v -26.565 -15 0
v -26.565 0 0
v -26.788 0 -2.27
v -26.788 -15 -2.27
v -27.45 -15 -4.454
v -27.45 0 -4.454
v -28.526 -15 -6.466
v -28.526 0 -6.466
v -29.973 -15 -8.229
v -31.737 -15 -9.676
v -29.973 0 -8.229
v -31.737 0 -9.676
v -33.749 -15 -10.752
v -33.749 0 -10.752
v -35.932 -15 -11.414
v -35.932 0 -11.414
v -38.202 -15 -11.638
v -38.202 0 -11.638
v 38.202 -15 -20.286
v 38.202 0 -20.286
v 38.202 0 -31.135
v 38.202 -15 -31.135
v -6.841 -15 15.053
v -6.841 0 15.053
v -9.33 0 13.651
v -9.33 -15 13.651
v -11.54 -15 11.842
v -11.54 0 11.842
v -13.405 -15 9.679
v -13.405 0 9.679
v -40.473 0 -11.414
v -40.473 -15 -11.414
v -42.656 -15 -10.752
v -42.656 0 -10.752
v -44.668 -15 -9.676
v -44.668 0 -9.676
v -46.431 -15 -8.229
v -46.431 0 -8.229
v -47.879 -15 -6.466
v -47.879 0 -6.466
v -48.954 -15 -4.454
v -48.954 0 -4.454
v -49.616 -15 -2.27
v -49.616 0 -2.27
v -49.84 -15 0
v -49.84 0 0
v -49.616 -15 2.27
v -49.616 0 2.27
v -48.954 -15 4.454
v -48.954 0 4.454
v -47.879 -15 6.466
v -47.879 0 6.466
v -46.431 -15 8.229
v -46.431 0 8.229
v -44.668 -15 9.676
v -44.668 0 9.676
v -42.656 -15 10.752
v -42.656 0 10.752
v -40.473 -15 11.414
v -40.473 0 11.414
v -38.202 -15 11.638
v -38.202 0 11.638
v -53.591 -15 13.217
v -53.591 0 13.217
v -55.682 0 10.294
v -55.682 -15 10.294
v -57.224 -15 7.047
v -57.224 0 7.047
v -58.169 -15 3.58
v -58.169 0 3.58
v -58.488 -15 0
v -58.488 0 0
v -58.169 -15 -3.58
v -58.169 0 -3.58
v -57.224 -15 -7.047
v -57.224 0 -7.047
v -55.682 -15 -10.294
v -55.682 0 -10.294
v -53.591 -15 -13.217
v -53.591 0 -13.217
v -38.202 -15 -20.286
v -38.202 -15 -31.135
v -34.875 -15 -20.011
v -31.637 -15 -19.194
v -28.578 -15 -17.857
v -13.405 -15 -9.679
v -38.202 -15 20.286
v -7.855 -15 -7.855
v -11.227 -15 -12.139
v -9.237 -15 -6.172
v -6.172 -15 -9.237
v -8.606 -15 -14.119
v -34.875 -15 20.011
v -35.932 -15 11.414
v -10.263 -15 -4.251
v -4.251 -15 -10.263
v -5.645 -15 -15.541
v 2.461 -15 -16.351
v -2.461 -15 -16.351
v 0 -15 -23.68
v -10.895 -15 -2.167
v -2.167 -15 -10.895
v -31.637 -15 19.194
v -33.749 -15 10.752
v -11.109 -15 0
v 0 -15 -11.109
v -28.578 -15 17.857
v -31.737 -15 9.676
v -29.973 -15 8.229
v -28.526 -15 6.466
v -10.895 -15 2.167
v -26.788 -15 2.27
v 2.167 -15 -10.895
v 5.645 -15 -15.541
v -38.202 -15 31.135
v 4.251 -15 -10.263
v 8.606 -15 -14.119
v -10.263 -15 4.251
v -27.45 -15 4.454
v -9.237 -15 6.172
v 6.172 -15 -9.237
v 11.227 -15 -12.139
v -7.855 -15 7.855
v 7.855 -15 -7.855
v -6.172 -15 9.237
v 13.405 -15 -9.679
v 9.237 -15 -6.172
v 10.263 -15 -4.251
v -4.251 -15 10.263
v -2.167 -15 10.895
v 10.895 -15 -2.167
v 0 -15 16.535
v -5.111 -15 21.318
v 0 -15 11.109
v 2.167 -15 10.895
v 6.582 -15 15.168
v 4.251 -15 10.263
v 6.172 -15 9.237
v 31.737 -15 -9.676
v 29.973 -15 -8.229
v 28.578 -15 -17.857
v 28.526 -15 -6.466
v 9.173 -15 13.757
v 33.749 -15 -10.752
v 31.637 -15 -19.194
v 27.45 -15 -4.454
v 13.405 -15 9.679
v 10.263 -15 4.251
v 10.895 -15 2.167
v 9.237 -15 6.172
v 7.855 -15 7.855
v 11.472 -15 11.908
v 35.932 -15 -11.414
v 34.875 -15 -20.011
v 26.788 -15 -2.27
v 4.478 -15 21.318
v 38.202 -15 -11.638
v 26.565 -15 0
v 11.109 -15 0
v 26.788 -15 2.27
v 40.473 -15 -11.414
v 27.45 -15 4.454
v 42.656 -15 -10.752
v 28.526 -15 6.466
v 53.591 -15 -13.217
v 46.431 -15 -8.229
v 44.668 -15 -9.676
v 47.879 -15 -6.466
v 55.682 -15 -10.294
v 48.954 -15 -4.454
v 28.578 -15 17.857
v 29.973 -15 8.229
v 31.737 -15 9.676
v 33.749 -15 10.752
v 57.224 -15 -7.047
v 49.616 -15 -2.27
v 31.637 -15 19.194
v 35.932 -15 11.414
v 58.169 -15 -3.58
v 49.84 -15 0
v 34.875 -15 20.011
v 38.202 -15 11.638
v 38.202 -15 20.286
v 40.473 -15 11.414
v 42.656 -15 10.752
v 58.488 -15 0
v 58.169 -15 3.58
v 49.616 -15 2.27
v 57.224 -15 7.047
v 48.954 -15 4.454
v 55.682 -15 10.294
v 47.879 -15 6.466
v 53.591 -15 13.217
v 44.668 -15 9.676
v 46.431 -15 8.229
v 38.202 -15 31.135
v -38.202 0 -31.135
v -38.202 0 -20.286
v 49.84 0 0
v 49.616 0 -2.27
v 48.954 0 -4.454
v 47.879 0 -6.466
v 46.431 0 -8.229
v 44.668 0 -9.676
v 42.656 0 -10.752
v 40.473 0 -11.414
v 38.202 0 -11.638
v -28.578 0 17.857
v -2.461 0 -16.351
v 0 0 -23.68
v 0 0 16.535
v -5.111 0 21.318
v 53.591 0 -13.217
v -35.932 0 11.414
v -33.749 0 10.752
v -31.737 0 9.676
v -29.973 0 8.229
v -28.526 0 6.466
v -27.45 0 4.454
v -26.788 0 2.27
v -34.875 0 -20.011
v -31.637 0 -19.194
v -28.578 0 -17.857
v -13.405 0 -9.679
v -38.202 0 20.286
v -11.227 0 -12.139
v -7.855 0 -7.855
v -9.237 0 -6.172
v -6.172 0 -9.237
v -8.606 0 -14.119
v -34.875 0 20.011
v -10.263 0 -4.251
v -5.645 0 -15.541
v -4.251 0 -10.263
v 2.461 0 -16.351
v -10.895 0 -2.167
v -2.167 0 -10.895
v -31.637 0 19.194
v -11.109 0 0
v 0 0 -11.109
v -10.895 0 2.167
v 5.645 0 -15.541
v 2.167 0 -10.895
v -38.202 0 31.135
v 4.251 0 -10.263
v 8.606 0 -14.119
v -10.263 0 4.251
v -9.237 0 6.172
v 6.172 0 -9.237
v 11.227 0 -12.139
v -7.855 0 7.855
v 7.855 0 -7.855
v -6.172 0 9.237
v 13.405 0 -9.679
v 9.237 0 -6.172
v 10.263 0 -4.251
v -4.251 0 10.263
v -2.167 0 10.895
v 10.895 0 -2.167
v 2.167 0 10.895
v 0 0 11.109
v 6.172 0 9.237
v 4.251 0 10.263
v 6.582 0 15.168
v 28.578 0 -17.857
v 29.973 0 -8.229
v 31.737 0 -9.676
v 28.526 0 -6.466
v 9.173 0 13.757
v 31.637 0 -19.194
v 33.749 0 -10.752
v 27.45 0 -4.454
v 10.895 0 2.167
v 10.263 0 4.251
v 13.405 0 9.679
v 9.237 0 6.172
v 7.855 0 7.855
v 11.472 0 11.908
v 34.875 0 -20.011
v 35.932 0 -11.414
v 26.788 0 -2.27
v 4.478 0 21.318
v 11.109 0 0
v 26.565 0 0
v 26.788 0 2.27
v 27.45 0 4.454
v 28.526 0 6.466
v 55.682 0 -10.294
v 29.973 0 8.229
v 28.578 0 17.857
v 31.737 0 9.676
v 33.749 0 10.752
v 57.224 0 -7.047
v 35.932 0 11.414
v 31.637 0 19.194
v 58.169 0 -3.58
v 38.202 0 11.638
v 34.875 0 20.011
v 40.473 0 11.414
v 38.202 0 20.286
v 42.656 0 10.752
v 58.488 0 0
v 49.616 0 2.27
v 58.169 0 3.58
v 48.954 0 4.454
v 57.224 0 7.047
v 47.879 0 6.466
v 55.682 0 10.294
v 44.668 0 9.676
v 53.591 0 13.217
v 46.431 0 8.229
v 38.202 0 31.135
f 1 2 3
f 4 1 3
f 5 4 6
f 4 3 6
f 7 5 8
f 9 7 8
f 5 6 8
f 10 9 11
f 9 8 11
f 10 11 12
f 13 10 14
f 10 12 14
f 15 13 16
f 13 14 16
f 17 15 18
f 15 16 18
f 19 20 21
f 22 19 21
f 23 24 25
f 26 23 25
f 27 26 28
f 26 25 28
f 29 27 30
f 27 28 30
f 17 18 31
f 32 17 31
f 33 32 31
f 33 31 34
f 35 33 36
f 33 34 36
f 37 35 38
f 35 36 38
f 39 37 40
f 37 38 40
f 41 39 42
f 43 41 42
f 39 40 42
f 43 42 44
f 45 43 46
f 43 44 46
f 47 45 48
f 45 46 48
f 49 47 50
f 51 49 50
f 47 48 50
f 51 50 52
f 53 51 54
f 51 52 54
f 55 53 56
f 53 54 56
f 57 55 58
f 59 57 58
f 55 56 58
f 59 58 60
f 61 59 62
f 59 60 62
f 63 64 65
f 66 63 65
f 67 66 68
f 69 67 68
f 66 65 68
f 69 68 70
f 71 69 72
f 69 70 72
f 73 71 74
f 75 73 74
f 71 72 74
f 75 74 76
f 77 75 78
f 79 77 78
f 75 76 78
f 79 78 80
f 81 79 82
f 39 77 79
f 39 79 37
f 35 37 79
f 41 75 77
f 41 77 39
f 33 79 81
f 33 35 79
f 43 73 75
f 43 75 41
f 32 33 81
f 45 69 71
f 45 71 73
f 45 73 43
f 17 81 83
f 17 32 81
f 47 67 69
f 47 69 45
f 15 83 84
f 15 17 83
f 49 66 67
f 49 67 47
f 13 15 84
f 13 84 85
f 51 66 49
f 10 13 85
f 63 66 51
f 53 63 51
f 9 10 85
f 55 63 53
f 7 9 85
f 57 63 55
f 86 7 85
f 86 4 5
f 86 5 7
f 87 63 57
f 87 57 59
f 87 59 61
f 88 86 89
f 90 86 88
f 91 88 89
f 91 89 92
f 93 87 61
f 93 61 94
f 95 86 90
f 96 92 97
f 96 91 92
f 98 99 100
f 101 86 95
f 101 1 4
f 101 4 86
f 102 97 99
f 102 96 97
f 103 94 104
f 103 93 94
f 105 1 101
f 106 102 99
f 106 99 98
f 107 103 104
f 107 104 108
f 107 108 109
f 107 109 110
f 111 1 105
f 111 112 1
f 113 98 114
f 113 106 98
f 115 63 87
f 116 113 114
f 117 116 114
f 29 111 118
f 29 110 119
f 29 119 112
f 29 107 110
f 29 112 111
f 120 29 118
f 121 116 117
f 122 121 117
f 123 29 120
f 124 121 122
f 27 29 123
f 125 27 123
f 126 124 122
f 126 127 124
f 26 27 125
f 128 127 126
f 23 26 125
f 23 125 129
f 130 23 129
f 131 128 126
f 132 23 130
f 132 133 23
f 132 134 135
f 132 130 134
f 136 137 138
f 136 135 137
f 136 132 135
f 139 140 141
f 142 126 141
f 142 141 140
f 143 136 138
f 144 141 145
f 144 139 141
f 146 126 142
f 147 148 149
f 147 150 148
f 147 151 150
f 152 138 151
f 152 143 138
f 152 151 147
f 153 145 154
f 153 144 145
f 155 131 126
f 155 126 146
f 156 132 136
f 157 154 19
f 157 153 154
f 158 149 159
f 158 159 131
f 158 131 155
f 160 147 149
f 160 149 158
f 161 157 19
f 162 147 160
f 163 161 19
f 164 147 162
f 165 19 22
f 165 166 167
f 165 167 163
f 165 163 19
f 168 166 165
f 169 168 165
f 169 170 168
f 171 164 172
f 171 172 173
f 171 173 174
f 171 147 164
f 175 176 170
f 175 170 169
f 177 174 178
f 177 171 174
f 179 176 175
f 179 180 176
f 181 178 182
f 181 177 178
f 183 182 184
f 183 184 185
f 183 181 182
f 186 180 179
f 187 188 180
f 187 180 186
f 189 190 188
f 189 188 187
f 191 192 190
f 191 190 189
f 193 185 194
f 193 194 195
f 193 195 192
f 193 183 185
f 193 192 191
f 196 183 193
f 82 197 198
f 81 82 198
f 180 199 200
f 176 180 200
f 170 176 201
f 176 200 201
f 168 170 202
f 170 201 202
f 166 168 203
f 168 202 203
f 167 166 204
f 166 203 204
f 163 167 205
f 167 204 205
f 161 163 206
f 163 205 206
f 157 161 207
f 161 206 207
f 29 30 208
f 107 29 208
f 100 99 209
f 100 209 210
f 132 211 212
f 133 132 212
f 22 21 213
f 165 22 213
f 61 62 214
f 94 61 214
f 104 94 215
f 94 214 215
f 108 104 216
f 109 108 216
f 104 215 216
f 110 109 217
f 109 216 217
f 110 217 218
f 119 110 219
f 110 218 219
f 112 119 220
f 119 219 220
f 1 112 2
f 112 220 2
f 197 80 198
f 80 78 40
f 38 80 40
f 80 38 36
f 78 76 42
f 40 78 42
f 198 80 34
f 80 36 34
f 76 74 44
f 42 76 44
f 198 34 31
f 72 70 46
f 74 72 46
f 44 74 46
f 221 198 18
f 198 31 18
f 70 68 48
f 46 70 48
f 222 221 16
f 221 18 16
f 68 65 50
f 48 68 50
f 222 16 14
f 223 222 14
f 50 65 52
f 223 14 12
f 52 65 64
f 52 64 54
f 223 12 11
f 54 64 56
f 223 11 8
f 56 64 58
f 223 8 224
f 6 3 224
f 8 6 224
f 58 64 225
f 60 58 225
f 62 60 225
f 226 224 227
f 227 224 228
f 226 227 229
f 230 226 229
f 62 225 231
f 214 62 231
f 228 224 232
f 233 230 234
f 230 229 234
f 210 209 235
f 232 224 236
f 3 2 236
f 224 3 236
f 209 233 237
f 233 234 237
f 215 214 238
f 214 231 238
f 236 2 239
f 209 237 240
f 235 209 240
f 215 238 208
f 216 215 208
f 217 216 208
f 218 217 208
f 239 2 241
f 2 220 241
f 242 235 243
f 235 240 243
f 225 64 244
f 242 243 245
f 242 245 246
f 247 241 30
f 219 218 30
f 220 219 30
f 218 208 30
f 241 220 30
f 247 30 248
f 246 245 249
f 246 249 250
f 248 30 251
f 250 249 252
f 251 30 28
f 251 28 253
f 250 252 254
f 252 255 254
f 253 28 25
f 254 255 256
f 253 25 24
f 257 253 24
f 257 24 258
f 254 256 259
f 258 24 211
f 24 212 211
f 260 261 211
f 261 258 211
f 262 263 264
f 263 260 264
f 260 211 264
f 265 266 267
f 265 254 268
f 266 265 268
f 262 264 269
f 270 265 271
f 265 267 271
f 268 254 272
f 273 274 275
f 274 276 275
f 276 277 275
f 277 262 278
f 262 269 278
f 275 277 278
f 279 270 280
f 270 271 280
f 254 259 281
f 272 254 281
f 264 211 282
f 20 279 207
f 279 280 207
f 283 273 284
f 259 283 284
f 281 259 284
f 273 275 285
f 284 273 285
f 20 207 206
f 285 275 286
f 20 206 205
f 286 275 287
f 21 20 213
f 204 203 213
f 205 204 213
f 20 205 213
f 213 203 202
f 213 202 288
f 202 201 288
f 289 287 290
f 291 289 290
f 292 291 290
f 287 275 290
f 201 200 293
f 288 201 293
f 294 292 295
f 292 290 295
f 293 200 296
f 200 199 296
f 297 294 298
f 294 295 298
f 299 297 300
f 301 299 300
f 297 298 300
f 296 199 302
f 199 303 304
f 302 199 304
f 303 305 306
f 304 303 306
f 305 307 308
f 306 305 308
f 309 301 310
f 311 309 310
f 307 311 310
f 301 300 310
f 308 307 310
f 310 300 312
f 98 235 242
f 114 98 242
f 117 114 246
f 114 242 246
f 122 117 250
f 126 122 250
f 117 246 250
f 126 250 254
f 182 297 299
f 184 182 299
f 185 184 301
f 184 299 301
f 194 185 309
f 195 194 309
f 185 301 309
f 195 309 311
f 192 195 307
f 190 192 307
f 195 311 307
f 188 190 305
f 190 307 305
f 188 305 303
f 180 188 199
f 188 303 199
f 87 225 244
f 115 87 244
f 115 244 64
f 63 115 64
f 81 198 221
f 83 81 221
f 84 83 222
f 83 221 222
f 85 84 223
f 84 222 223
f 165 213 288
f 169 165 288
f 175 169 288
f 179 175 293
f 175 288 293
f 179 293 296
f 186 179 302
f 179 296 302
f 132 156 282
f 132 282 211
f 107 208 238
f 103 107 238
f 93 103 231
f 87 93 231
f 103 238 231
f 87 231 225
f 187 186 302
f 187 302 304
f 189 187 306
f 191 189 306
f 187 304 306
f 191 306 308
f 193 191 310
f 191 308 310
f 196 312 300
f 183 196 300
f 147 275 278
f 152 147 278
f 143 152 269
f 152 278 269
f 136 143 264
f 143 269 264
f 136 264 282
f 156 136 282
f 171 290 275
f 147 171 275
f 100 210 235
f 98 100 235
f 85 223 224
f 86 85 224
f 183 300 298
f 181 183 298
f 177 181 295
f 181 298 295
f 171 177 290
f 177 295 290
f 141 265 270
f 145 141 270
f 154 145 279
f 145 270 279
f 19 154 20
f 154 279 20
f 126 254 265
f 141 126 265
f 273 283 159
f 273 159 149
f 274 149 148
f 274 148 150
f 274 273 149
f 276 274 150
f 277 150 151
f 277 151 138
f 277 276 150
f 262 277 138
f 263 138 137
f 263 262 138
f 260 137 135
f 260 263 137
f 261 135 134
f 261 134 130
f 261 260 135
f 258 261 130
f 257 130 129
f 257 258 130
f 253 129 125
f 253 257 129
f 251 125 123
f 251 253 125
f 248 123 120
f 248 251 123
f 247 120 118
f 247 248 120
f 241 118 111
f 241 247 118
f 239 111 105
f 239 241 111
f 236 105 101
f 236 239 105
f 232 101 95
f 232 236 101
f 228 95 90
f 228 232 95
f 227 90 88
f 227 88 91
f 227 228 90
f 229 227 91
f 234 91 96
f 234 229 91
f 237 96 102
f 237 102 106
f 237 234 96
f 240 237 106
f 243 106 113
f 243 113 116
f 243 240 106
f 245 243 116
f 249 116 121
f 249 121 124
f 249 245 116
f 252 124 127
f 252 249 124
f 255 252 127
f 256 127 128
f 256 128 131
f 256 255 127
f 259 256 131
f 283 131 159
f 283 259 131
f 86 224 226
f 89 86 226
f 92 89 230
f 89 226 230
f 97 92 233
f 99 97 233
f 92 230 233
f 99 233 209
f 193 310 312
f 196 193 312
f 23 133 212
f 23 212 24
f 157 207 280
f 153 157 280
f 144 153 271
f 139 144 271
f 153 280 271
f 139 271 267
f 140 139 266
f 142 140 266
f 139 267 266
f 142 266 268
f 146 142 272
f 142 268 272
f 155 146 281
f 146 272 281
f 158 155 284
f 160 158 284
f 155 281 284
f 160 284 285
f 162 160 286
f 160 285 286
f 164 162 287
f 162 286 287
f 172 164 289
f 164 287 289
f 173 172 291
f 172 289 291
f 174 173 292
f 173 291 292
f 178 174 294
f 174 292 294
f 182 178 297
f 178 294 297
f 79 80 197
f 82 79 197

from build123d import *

# Parameters (mm, degrees)
F0_R     = 11.1087126895
F1_DEPTH = 15


with BuildPart() as f1:
    # F0 (on Front) → F1 (new body)
    with BuildSketch(Plane.XZ):
        with BuildLine():
            ThreePointArc((13.4054841173, -9.6794165893), (15.7329987638, -5.0863405143), (16.5347546074, 0))
            ThreePointArc((16.5347546074, 0), (15.7329987638, 5.0863405143), (13.4054841173, 9.6794165893))
            ThreePointArc((13.4054841173, 9.6794165893), (10.3636127764, 12.8838519143), (6.5817506, 15.1683443054))
            ThreePointArc((6.5817506, 15.1683443054), (3.3610458965, 16.1895484931), (0, 16.5347546074))
            Line((0, 16.5347546074), (-6.84138025, 15.0530271442))
            ThreePointArc((-6.84138025, 15.0530271442), (-10.4739105293, 12.7943467263), (-13.4054841173, 9.6794165893))
            ThreePointArc((-13.4054841173, 9.6794165893), (-16.5347546074, 0), (-13.4054841173, -9.6794165893))
            ThreePointArc((-13.4054841173, -9.6794165893), (-8.6057957477, -14.1187247823), (-2.46063304, -16.3506389774))
            ThreePointArc((-2.46063304, -16.3506389774), (-1.2337558027, -16.4886614541), (0, -16.5347546074))
            ThreePointArc((0, -16.5347546074), (1.2337558027, -16.4886614541), (2.46063304, -16.3506389774))
            ThreePointArc((2.46063304, -16.3506389774), (8.6057957477, -14.1187247823), (13.4054841173, -9.6794165893))
        make_face()
        Circle(F0_R, mode=Mode.SUBTRACT)
        with BuildLine():
            ThreePointArc((13.4054841173, 9.6794165893), (15.7329987638, 5.0863405143), (16.5347546074, 0))
            ThreePointArc((16.5347546074, 0), (15.7329987638, -5.0863405143), (13.4054841173, -9.6794165893))
            Line((13.4054841173, -9.6794165893), (28.5778386551, -17.8569645029))
            ThreePointArc((28.5778386551, -17.8569645029), (17.9168171415, 0), (28.5778386551, 17.8569645029))
            Line((28.5778386551, 17.8569645029), (13.4054841173, 9.6794165893))
        make_face()
        with BuildLine():
            ThreePointArc((0, 16.5347546074), (3.3610458965, 16.1895484931), (6.5817506, 15.1683443054))
            Line((6.5817506, 15.1683443054), (4.477564806, 21.3183363497))
            Line((4.477564806, 21.3183363497), (0, 16.5347546074))
        make_face()
        with BuildLine():
            ThreePointArc((38.2023292013, 20.2855120599), (33.2392489705, 19.6690069438), (28.5778386551, 17.8569645029))
            ThreePointArc((28.5778386551, 17.8569645029), (17.9168171415, 0), (28.5778386551, -17.8569645029))
            ThreePointArc((28.5778386551, -17.8569645029), (33.2392489705, -19.6690069438), (38.2023292013, -20.2855120599))
            Line((38.2023292013, -20.2855120599), (38.2023292013, -11.637699008))
            ThreePointArc((38.2023292013, -11.637699008), (26.5646301933, 0), (38.2023292013, 11.637699008))
            Line((38.2023292013, 11.637699008), (38.2023292013, 20.2855120599))
        make_face()
        with BuildLine():
            Line((0, -23.6800604716), (2.46063304, -16.3506389774))
            ThreePointArc((2.46063304, -16.3506389774), (1.2337558027, -16.4886614541), (0, -16.5347546074))
            Line((0, -16.5347546074), (0, -23.6800604716))
        make_face()
        with BuildLine():
            Line((-6.84138025, 15.0530271442), (0, 16.5347546074))
            ThreePointArc((0, 16.5347546074), (-3.5, 16.1600776585), (-6.84138025, 15.0530271442))
        make_face()
        with BuildLine():
            ThreePointArc((-6.84138025, 15.0530271442), (-3.5, 16.1600776585), (0, 16.5347546074))
            Line((0, 16.5347546074), (-5.1105132536, 21.3183363497))
            Line((-5.1105132536, 21.3183363497), (-6.84138025, 15.0530271442))
        make_face()
        with BuildLine():
            Line((38.2023292013, 31.1350713114), (38.2023292013, 20.2855120599))
            ThreePointArc((38.2023292013, 20.2855120599), (46.6697685138, 18.4337861282), (53.5913383502, 13.216671175))
            Line((53.5913383502, 13.216671175), (38.2023292013, 31.1350713114))
        make_face()
        with BuildLine():
            ThreePointArc((53.5913383502, 13.216671175), (46.6697685138, 18.4337861282), (38.2023292013, 20.2855120599))
            Line((38.2023292013, 20.2855120599), (38.2023292013, 11.637699008))
            ThreePointArc((38.2023292013, 11.637699008), (46.4314250873, 8.229095886), (49.8400282094, 0))
            ThreePointArc((49.8400282094, 0), (46.4314250873, -8.229095886), (38.2023292013, -11.637699008))
            Line((38.2023292013, -11.637699008), (38.2023292013, -20.2855120599))
            ThreePointArc((38.2023292013, -20.2855120599), (46.6697685138, -18.4337861282), (53.5913383502, -13.216671175))
            ThreePointArc((53.5913383502, -13.216671175), (57.2243681327, -7.0472714171), (58.4878412612, 0))
            ThreePointArc((58.4878412612, 0), (57.2243681327, 7.0472714171), (53.5913383502, 13.216671175))
        make_face()
        with BuildLine():
            Line((0, -23.6800604716), (0, -16.5347546074))
            ThreePointArc((0, -16.5347546074), (-1.2337558027, -16.4886614541), (-2.46063304, -16.3506389774))
            Line((-2.46063304, -16.3506389774), (0, -23.6800604716))
        make_face()
        with BuildLine():
            ThreePointArc((53.5913383502, -13.216671175), (46.6697685138, -18.4337861282), (38.2023292013, -20.2855120599))
            Line((38.2023292013, -20.2855120599), (38.2023292013, -31.1350713114))
            Line((38.2023292013, -31.1350713114), (53.5913383502, -13.216671175))
        make_face()
        with BuildLine():
            ThreePointArc((-13.4054841173, -9.6794165893), (-16.5347546074, 0), (-13.4054841173, 9.6794165893))
            Line((-13.4054841173, 9.6794165893), (-28.5778386551, 17.8569645029))
            ThreePointArc((-28.5778386551, 17.8569645029), (-20.7848133254, 10.3986605023), (-17.9168171415, 0))
            ThreePointArc((-17.9168171415, 0), (-20.7848133254, -10.3986605023), (-28.5778386551, -17.8569645029))
            Line((-28.5778386551, -17.8569645029), (-13.4054841173, -9.6794165893))
        make_face()
        with BuildLine():
            ThreePointArc((-17.9168171415, 0), (-20.7848133254, 10.3986605023), (-28.5778386551, 17.8569645029))
            ThreePointArc((-28.5778386551, 17.8569645029), (-33.2392489705, 19.6690069438), (-38.2023292013, 20.2855120599))
            Line((-38.2023292013, 20.2855120599), (-38.2023292013, 11.637699008))
            ThreePointArc((-38.2023292013, 11.637699008), (-29.9732333154, 8.229095886), (-26.5646301933, 0))
            ThreePointArc((-26.5646301933, 0), (-29.9732333154, -8.229095886), (-38.2023292013, -11.637699008))
            Line((-38.2023292013, -11.637699008), (-38.2023292013, -20.2855120599))
            ThreePointArc((-38.2023292013, -20.2855120599), (-33.2392489705, -19.6690069438), (-28.5778386551, -17.8569645029))
            ThreePointArc((-28.5778386551, -17.8569645029), (-20.7848133254, -10.3986605023), (-17.9168171415, 0))
        make_face()
        with BuildLine():
            Line((-38.2023292013, 11.637699008), (-38.2023292013, 20.2855120599))
            ThreePointArc((-38.2023292013, 20.2855120599), (-46.6697685138, 18.4337861282), (-53.5913383502, 13.216671175))
            ThreePointArc((-53.5913383502, 13.216671175), (-58.4878412612, 0), (-53.5913383502, -13.216671175))
            ThreePointArc((-53.5913383502, -13.216671175), (-46.6697685138, -18.4337861282), (-38.2023292013, -20.2855120599))
            Line((-38.2023292013, -20.2855120599), (-38.2023292013, -11.637699008))
            ThreePointArc((-38.2023292013, -11.637699008), (-49.8400282094, 0), (-38.2023292013, 11.637699008))
        make_face()
        with BuildLine():
            ThreePointArc((-53.5913383502, 13.216671175), (-46.6697685138, 18.4337861282), (-38.2023292013, 20.2855120599))
            Line((-38.2023292013, 20.2855120599), (-38.2023292013, 31.1350713114))
            Line((-38.2023292013, 31.1350713114), (-53.5913383502, 13.216671175))
        make_face()
        with BuildLine():
            Line((-38.2023292013, -31.1350713114), (-38.2023292013, -20.2855120599))
            ThreePointArc((-38.2023292013, -20.2855120599), (-46.6697685138, -18.4337861282), (-53.5913383502, -13.216671175))
            Line((-53.5913383502, -13.216671175), (-38.2023292013, -31.1350713114))
        make_face()
    extrude(amount=F1_DEPTH)


solid = f1.part
